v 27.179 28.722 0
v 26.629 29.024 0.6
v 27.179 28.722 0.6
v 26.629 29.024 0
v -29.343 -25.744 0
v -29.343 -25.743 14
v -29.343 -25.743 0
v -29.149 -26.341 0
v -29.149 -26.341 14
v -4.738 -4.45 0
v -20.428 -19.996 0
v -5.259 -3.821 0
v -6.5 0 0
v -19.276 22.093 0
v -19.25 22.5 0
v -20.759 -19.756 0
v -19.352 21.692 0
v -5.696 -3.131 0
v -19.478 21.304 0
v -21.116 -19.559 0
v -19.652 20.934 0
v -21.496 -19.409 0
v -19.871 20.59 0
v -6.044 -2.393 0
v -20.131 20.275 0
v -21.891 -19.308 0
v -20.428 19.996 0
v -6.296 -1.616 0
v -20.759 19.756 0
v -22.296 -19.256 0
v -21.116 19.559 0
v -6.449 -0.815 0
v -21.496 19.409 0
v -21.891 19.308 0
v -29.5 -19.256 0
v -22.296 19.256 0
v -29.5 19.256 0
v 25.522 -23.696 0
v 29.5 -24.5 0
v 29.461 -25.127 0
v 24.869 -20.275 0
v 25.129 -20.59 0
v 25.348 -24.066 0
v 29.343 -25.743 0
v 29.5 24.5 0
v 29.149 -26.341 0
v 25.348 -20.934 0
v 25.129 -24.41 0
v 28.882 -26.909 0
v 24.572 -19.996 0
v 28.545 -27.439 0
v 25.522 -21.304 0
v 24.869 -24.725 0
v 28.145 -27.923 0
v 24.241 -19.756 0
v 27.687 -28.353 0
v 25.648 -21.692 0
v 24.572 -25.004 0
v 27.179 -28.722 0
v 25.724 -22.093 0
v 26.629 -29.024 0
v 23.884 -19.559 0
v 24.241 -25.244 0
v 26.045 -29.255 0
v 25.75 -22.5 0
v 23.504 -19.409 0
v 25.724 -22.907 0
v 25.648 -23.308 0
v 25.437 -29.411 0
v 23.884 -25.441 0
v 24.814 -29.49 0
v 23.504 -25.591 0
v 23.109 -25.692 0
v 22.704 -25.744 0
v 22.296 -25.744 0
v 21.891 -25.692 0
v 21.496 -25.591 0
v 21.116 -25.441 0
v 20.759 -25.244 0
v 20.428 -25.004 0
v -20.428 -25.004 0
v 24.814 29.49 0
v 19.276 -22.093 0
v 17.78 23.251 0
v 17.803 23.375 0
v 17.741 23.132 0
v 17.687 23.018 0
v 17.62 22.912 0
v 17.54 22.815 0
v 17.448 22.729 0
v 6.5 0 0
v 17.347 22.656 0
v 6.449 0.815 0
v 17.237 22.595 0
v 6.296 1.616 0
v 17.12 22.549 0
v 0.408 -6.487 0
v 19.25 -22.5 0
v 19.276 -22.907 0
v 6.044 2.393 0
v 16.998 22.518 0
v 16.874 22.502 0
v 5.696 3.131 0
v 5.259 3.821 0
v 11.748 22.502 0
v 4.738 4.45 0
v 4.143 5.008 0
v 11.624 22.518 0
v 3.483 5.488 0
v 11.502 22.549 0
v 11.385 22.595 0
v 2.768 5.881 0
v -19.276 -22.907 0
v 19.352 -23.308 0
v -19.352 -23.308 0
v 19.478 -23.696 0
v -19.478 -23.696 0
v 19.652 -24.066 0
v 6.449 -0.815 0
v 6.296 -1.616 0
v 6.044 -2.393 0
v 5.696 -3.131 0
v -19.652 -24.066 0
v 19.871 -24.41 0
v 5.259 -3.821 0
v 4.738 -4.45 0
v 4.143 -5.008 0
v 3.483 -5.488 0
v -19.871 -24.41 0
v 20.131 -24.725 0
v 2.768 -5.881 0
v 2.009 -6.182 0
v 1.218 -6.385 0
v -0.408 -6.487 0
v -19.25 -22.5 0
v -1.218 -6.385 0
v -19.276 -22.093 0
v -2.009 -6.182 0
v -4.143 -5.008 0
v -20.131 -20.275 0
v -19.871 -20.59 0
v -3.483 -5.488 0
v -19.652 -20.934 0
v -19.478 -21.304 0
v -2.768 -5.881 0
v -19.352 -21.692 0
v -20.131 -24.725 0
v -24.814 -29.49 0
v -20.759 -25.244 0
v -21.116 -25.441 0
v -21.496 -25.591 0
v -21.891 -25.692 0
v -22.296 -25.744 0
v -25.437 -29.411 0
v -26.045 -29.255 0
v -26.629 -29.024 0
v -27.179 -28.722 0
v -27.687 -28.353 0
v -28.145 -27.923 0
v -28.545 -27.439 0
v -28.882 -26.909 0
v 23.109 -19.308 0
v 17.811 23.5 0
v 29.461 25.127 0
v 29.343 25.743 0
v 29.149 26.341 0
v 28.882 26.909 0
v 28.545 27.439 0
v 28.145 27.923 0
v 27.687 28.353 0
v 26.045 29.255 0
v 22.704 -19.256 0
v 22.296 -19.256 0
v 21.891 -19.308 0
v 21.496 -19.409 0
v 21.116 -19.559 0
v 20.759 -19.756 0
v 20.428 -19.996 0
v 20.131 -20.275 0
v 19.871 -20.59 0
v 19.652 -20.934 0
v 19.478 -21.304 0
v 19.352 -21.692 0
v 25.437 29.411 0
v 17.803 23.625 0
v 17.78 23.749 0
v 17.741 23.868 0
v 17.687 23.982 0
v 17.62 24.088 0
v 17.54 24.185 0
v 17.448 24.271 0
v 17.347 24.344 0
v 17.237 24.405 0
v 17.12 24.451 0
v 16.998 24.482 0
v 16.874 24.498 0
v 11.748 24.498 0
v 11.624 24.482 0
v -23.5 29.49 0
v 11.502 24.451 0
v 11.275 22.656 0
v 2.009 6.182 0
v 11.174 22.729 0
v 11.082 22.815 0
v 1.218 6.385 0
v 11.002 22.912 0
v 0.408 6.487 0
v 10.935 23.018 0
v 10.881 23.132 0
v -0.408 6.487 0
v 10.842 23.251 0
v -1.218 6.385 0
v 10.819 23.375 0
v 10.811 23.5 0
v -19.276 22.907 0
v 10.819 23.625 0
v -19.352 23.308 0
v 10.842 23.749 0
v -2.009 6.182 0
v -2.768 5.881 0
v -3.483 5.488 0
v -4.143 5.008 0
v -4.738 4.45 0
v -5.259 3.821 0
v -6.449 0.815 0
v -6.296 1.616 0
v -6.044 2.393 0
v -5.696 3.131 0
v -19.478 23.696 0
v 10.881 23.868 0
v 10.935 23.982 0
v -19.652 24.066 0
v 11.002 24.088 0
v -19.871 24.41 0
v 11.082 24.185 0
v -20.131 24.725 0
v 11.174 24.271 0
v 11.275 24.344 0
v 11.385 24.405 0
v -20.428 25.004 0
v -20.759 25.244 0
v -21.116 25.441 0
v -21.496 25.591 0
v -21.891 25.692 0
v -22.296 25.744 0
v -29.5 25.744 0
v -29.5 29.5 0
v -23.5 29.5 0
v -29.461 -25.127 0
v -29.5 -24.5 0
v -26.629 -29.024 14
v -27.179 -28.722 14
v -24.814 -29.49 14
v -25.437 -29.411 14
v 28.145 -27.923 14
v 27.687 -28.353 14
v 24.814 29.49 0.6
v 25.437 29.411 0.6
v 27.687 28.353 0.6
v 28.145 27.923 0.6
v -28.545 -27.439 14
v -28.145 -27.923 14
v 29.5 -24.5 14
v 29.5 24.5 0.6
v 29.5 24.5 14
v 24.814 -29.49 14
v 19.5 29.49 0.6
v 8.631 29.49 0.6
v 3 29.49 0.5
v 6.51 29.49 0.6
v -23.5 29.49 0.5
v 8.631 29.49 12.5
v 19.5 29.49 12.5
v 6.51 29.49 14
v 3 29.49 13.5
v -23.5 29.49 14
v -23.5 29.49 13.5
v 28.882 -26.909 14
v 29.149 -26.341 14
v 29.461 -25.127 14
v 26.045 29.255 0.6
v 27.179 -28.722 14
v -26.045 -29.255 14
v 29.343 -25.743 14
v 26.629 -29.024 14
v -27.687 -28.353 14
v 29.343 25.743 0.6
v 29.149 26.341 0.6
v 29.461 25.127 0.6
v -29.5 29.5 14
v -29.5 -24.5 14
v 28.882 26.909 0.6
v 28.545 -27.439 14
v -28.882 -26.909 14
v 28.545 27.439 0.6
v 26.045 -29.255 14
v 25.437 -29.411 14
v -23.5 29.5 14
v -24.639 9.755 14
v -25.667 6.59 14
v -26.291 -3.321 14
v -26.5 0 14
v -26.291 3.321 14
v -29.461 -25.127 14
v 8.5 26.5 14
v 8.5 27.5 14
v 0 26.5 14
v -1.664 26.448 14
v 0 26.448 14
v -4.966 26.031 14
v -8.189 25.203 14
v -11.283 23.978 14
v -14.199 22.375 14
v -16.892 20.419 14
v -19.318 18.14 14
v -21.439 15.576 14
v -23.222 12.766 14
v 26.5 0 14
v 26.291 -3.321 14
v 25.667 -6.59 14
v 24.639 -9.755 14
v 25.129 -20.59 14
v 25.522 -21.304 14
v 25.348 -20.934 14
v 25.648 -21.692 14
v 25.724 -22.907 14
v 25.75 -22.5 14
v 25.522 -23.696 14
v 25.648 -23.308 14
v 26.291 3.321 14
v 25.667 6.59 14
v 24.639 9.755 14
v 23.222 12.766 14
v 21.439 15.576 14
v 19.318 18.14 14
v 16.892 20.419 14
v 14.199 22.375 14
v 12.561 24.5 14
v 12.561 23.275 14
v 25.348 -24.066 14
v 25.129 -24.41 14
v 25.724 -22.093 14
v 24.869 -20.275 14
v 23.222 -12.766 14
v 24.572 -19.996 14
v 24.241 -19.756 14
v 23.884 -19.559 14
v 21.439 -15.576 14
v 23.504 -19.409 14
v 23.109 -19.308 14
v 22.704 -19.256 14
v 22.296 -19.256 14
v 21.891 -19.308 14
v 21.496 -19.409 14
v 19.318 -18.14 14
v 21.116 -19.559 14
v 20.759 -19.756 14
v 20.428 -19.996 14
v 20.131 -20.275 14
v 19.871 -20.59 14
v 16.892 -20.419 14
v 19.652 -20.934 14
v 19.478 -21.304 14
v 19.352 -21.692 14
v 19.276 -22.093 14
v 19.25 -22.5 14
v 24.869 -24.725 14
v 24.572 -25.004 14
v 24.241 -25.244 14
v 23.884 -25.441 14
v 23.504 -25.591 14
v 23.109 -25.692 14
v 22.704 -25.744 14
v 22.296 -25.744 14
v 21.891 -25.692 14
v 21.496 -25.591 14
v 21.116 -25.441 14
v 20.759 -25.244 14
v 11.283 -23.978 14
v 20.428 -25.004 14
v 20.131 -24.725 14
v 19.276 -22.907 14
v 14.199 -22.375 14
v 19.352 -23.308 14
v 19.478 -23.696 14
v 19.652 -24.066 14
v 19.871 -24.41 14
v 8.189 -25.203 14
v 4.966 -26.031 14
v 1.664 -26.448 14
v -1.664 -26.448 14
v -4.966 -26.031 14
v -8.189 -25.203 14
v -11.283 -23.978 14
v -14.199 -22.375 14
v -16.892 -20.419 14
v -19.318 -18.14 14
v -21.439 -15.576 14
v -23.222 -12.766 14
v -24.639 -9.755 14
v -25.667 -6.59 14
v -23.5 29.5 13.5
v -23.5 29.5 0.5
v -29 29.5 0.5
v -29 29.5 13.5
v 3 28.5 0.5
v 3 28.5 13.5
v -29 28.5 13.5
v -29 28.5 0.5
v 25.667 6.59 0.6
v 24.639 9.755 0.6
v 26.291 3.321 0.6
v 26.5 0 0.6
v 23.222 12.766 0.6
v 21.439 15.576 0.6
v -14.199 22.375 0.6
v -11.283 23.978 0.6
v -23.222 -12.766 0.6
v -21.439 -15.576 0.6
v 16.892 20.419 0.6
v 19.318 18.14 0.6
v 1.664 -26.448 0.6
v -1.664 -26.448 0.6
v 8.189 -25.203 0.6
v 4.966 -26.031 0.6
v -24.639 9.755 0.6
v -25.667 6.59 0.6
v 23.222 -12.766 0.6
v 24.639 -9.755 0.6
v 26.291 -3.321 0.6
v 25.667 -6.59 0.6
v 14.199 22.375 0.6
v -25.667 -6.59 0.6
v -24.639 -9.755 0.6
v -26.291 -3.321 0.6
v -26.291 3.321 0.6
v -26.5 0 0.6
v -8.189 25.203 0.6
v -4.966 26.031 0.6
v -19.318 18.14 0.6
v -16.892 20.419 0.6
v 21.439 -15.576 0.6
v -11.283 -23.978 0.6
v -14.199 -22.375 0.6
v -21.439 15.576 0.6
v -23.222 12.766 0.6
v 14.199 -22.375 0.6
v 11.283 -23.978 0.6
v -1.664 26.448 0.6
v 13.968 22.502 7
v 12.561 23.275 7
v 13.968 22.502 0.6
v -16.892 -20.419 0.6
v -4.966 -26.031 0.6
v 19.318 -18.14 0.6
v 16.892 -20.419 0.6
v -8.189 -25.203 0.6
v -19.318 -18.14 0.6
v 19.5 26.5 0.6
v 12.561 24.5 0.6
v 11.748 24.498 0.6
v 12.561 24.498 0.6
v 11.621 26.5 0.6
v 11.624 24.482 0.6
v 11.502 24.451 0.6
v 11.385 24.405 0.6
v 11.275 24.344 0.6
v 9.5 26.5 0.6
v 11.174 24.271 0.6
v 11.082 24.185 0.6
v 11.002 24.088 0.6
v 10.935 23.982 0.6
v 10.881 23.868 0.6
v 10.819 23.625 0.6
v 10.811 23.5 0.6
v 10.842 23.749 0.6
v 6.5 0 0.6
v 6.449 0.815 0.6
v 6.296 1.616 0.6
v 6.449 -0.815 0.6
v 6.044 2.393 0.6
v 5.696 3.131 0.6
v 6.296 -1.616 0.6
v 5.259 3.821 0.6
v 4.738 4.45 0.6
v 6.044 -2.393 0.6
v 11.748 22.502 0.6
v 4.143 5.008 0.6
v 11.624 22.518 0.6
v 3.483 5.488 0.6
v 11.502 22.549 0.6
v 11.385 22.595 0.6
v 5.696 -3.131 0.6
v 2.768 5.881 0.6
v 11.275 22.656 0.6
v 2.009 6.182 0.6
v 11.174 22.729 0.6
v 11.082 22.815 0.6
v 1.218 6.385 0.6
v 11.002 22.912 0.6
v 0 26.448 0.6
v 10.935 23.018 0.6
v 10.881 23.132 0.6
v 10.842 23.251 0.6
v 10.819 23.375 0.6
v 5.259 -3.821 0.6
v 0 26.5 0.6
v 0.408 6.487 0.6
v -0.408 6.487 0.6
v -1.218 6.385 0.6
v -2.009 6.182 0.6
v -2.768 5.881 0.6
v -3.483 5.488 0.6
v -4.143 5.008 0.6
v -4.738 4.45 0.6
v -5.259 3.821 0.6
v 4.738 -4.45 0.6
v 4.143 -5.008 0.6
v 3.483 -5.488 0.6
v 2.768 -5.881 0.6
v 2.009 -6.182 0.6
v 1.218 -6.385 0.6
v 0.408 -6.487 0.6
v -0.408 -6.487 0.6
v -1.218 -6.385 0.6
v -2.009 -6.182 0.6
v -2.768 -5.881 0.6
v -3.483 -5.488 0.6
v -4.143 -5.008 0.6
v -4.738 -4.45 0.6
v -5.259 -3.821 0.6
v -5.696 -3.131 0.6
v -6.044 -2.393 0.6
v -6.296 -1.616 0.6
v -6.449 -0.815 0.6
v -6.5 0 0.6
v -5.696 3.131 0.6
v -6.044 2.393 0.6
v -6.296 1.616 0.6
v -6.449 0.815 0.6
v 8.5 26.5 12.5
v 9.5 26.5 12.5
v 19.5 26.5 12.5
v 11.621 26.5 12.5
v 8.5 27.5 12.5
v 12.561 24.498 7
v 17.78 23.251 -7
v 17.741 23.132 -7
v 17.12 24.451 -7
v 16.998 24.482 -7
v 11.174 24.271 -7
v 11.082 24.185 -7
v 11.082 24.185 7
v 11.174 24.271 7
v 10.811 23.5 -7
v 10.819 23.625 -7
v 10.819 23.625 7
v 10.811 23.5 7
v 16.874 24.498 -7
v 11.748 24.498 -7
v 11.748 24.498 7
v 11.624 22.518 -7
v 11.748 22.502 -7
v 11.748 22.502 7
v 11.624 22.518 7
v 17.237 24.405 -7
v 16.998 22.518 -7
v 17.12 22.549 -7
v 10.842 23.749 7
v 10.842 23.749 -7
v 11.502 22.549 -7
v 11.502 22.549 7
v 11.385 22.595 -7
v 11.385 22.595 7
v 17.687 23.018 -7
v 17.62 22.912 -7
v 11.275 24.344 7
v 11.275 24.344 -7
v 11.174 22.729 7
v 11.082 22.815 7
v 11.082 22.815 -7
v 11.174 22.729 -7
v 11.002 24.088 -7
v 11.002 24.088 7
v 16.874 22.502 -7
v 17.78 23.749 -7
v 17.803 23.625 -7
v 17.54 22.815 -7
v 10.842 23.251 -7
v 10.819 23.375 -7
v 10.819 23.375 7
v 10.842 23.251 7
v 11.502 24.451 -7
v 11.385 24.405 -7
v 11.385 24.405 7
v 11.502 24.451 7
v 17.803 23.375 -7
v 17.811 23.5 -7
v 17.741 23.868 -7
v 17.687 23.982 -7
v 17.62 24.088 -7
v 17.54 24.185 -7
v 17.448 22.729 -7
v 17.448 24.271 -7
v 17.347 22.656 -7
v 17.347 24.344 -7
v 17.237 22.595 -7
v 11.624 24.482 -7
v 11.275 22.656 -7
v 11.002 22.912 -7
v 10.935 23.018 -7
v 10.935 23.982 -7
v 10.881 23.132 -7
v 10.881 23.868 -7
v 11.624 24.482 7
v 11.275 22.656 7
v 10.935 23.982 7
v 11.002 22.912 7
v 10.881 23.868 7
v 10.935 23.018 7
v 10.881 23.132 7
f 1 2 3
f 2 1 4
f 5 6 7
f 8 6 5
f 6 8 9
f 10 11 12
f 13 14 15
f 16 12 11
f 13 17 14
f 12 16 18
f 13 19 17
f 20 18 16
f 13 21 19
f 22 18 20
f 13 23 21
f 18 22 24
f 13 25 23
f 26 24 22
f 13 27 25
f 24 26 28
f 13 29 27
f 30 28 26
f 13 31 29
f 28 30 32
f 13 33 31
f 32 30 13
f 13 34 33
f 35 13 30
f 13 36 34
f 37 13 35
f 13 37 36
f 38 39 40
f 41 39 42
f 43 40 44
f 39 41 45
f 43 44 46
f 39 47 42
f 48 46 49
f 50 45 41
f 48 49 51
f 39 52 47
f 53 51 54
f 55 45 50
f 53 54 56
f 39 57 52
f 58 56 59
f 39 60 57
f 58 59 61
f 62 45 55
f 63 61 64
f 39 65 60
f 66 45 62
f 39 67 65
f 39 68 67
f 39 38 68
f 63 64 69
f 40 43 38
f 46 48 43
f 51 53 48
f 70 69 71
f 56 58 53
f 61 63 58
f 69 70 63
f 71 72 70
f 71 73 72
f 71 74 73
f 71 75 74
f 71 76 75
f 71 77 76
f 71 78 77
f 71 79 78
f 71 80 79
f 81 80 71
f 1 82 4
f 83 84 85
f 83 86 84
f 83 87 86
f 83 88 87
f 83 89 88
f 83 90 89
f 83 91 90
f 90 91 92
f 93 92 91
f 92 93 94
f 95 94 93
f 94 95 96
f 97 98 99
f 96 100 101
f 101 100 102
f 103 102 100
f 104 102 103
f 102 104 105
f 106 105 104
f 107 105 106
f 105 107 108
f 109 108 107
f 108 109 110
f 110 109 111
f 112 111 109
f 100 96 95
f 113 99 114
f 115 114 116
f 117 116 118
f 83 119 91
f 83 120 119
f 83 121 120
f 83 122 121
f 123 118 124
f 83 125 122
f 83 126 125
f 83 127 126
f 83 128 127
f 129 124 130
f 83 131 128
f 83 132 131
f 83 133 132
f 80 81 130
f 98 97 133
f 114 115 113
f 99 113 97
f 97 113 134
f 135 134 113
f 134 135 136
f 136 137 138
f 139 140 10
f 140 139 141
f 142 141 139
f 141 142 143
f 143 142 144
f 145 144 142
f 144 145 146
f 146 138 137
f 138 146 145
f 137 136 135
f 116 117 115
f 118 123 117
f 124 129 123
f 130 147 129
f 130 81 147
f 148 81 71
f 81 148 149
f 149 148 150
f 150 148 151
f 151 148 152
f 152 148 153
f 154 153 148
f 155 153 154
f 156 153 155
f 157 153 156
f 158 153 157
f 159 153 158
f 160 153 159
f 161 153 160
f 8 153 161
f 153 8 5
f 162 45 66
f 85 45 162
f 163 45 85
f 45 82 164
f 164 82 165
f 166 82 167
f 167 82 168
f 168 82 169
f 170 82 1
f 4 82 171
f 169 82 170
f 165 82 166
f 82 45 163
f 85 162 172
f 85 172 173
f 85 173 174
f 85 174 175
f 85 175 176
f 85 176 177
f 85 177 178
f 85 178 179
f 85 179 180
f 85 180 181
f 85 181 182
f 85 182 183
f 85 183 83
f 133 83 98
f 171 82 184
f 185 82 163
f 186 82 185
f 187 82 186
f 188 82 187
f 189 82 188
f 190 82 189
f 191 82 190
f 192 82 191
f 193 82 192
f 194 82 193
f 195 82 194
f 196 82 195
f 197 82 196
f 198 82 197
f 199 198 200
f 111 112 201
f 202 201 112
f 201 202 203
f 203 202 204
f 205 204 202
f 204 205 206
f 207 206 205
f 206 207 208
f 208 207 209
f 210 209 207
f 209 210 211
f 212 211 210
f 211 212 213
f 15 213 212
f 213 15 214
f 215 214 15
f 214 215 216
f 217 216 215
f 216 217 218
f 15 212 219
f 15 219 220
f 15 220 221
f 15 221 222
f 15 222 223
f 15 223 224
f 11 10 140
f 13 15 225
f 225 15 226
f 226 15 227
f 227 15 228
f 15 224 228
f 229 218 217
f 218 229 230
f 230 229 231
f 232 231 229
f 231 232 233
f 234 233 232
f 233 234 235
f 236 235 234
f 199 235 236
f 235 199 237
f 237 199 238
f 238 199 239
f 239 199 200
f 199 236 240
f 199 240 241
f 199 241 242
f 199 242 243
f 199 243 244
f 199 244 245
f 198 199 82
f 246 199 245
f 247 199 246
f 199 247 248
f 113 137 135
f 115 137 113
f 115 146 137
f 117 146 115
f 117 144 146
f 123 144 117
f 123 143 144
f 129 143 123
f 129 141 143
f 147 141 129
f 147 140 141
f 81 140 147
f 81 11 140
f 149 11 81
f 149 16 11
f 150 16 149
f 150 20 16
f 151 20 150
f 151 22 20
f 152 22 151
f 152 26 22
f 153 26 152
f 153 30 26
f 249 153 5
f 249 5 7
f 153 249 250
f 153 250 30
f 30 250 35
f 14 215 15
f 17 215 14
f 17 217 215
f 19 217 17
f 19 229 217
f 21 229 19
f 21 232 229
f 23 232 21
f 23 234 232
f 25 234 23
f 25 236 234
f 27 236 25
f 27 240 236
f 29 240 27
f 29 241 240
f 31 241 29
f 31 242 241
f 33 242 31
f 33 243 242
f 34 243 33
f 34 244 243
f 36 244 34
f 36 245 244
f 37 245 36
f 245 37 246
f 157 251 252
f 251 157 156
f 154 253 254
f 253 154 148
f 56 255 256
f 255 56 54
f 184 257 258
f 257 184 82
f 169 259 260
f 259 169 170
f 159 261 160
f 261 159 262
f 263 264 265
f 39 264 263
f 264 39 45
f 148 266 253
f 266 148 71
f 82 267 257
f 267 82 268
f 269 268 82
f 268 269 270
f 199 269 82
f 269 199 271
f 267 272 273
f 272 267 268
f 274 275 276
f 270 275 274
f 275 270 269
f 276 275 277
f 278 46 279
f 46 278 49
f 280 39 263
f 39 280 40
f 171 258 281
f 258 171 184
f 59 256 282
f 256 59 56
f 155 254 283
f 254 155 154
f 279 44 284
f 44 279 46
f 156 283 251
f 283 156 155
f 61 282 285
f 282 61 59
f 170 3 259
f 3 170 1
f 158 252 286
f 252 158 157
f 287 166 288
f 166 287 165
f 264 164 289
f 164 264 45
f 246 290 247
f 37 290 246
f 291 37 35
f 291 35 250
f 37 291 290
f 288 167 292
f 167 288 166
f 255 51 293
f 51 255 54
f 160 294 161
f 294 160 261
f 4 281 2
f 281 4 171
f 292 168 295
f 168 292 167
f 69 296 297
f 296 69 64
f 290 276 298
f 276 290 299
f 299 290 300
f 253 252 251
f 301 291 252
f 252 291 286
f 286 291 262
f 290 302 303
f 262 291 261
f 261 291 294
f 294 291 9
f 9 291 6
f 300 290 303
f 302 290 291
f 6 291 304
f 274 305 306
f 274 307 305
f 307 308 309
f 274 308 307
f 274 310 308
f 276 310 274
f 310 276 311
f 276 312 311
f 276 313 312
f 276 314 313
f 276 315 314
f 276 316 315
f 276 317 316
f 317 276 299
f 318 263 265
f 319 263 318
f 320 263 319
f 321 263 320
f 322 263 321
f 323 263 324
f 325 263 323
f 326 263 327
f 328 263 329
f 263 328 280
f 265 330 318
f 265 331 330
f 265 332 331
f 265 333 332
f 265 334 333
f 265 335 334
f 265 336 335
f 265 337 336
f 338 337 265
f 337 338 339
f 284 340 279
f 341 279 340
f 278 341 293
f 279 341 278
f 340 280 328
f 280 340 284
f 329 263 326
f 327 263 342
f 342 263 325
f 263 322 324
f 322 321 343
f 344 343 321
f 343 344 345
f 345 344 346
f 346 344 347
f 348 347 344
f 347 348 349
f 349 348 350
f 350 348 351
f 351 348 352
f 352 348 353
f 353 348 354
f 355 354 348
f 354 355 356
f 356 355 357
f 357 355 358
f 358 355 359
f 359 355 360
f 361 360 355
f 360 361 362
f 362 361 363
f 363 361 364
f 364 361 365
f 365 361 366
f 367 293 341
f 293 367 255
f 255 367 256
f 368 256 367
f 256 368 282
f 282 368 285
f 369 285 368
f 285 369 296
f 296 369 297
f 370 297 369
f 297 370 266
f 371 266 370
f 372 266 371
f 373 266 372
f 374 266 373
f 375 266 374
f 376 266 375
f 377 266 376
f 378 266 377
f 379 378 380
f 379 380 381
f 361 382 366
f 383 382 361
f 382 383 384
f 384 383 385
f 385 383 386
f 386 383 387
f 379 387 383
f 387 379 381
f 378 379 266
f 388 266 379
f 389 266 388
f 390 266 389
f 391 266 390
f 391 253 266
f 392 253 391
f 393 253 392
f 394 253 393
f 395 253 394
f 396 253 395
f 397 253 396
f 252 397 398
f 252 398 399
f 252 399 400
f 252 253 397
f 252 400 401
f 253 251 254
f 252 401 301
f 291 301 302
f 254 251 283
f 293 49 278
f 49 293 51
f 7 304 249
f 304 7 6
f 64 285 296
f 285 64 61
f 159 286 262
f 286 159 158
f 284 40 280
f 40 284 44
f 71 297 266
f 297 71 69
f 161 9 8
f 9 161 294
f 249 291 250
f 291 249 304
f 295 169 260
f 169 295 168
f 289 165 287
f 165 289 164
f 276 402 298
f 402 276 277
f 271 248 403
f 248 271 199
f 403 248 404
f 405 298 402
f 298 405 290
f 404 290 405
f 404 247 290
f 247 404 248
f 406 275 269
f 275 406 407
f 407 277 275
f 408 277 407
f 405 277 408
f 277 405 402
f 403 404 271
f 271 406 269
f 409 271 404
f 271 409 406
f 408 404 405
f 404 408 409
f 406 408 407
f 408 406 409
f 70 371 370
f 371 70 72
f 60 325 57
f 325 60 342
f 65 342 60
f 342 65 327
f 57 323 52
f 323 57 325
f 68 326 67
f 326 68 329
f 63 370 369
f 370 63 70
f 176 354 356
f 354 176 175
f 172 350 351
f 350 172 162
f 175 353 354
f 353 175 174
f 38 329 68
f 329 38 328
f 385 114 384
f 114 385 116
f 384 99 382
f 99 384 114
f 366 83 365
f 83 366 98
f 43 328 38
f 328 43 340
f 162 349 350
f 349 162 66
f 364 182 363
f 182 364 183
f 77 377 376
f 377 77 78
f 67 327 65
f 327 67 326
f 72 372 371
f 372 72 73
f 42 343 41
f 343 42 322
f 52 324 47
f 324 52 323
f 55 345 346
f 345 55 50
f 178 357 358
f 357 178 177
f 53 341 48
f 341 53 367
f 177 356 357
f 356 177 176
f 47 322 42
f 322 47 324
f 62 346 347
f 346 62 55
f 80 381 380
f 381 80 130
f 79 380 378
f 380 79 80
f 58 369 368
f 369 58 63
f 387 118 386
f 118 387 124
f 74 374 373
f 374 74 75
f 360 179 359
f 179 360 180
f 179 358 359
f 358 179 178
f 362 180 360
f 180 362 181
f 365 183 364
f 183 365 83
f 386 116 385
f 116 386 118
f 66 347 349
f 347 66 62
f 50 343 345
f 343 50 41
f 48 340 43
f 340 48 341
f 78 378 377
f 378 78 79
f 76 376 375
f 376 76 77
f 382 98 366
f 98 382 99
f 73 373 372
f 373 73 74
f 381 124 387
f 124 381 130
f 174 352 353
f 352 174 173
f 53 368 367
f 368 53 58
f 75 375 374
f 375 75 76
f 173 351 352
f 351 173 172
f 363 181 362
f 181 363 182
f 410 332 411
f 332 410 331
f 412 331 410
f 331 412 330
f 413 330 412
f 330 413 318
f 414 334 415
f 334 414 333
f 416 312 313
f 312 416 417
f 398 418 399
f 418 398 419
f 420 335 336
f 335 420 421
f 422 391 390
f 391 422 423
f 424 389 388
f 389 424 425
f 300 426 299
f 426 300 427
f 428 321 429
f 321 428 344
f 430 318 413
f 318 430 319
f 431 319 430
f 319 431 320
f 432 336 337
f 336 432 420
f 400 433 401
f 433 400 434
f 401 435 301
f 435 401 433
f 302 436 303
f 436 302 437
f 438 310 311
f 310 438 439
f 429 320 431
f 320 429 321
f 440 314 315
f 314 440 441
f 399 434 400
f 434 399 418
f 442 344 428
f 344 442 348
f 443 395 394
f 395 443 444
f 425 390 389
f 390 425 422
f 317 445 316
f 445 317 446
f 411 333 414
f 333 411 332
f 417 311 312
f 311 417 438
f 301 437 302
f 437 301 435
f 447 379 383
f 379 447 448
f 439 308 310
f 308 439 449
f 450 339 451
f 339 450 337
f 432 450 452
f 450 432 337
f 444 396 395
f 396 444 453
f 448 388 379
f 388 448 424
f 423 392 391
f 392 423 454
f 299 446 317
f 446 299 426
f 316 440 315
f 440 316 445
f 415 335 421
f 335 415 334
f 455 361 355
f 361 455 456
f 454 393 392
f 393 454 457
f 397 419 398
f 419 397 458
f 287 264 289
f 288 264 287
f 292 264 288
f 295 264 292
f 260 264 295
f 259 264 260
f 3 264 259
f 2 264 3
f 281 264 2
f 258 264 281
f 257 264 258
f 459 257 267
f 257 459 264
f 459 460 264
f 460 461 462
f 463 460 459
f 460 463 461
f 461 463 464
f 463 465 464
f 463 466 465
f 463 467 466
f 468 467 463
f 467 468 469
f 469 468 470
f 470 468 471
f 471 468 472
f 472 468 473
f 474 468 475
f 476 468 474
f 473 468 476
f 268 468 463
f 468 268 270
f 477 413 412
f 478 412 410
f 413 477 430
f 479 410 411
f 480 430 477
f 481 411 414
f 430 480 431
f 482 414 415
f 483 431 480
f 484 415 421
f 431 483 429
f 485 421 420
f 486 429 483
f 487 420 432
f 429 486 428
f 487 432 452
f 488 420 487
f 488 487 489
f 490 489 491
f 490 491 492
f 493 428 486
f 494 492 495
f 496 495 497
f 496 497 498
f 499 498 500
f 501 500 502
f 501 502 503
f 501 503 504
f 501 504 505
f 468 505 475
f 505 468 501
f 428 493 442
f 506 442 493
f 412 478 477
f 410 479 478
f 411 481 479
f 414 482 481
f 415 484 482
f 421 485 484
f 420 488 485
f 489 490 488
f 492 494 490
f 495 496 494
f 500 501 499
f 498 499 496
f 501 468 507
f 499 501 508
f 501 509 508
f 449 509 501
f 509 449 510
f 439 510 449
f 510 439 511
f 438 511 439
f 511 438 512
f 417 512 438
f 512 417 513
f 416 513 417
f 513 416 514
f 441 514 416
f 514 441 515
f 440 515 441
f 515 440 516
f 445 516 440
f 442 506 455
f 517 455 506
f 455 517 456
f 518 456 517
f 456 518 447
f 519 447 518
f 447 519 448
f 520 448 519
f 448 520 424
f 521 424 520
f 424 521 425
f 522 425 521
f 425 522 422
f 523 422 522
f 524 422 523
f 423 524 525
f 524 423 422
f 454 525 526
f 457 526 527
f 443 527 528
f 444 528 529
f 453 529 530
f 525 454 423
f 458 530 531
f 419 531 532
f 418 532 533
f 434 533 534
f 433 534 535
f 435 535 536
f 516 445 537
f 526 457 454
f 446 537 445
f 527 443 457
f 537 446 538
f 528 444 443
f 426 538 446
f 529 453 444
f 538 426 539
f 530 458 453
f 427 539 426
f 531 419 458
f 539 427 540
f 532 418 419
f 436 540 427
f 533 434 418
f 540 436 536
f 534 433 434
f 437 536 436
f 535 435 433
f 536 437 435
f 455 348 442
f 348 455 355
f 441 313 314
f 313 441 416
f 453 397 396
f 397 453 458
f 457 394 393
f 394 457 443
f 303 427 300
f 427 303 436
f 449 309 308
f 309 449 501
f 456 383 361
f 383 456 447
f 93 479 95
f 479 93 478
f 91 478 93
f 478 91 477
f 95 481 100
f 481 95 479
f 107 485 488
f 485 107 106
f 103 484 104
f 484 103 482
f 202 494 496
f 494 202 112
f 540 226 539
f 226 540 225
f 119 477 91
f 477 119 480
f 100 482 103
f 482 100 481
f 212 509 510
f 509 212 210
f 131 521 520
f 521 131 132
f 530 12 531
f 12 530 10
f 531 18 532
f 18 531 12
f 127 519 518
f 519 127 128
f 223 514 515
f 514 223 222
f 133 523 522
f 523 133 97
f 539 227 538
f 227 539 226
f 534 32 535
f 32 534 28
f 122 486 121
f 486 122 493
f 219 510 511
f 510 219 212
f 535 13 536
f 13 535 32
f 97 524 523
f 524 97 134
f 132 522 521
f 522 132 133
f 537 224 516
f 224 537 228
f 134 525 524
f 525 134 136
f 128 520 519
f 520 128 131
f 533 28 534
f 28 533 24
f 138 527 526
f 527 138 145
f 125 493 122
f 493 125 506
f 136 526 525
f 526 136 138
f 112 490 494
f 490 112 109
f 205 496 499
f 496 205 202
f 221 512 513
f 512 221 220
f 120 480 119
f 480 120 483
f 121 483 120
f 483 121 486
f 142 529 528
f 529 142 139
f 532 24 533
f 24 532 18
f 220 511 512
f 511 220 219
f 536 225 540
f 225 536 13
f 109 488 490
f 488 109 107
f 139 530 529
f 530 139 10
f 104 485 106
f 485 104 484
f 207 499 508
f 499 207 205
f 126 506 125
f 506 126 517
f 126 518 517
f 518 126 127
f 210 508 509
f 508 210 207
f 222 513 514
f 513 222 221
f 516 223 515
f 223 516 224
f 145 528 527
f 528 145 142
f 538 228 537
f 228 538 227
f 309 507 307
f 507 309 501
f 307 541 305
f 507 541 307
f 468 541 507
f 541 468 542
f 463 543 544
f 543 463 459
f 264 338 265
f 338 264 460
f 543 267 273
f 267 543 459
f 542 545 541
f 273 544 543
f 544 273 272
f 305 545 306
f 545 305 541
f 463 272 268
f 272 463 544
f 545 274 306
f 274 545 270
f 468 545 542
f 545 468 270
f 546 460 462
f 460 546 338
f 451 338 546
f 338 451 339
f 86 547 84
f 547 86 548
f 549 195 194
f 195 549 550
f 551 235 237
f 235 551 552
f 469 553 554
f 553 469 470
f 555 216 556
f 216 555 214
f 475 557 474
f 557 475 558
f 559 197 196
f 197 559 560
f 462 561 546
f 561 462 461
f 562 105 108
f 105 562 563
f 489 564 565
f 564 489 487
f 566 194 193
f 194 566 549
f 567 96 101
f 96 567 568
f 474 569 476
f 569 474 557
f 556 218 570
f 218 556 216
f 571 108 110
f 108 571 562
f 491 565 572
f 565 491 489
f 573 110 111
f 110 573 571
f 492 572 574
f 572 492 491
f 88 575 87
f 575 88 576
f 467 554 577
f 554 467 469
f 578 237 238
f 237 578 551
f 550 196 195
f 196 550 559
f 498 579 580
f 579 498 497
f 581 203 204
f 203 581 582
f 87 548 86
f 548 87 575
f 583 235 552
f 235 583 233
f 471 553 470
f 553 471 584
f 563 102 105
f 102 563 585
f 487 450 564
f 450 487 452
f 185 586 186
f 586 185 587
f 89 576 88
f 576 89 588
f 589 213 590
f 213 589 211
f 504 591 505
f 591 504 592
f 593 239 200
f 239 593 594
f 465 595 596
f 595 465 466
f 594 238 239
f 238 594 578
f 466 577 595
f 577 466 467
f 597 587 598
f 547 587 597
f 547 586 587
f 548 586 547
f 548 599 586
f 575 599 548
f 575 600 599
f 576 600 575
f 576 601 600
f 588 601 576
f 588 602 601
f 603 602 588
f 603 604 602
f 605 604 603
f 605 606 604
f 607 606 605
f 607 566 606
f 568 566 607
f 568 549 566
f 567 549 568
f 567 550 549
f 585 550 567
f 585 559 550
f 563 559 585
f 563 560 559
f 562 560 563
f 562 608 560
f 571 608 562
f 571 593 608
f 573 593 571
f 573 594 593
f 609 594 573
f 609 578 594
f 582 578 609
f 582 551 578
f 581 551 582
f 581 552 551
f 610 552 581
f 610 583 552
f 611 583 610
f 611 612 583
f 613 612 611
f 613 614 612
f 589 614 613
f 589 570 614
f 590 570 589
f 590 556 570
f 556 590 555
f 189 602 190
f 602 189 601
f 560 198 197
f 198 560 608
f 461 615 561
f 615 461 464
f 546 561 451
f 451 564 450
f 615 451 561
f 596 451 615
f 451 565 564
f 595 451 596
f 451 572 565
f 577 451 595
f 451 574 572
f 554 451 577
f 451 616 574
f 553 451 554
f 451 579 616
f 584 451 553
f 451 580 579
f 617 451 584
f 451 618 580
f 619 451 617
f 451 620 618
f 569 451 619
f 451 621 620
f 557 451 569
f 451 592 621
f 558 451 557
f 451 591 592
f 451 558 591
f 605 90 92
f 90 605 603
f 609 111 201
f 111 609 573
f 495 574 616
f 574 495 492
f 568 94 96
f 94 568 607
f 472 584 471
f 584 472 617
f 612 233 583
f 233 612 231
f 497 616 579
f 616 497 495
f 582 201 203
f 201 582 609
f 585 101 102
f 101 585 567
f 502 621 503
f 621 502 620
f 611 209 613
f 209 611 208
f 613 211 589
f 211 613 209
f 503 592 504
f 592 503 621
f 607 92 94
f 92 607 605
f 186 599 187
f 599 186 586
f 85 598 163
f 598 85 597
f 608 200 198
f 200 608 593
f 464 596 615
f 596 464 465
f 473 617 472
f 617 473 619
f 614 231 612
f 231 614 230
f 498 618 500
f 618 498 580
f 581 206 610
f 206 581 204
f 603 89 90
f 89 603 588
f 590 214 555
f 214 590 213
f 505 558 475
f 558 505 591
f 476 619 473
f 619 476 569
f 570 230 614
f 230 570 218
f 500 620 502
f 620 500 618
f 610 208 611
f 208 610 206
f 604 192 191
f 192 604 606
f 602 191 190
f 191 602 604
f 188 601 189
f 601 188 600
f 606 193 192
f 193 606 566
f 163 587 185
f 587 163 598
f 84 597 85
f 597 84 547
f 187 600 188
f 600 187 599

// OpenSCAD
$fn = 50;


union() {
	difference() {
		union() {
			hull() {
				translate(v = [-24.5000000000, 24.5000000000, 0]) {
					cylinder(h = 14, r = 5);
				}
				translate(v = [24.5000000000, 24.5000000000, 0]) {
					cylinder(h = 14, r = 5);
				}
				translate(v = [-24.5000000000, -24.5000000000, 0]) {
					cylinder(h = 14, r = 5);
				}
				translate(v = [24.5000000000, -24.5000000000, 0]) {
					cylinder(h = 14, r = 5);
				}
			}
			translate(v = [-29.5000000000, 23.5000000000, 0]) {
				cube(size = [6, 6, 14]);
			}
		}
		union() {
			translate(v = [-30.0000000000, -22.5000000000, -250.0000000000]) {
				rotate(a = [0, 0, 0]) {
					difference() {
						union() {
							hull() {
								translate(v = [7.5000000000, 0, 0]) {
									cylinder(h = 250, r = 3.2500000000, r1 = 3.2500000000, r2 = 3.2500000000);
								}
								translate(v = [-7.5000000000, 0, 0]) {
									cylinder(h = 250, r = 3.2500000000, r1 = 3.2500000000, r2 = 3.2500000000);
								}
							}
						}
						union();
					}
				}
			}
			translate(v = [-30.0000000000, 22.5000000000, -250.0000000000]) {
				rotate(a = [0, 0, 0]) {
					difference() {
						union() {
							hull() {
								translate(v = [7.5000000000, 0, 0]) {
									cylinder(h = 250, r = 3.2500000000, r1 = 3.2500000000, r2 = 3.2500000000);
								}
								translate(v = [-7.5000000000, 0, 0]) {
									cylinder(h = 250, r = 3.2500000000, r1 = 3.2500000000, r2 = 3.2500000000);
								}
							}
						}
						union();
					}
				}
			}
			translate(v = [-29.0000000000, 28.5000000000, 0.5000000000]) {
				cube(size = [32, 1, 13.0000000000]);
			}
			translate(v = [22.5000000000, -22.5000000000, 0]) {
				cylinder(h = 100, r = 3.2500000000);
			}
			translate(v = [0, 0, 0.6000000000]) {
				cylinder(h = 16.4000000000, r = 26.5000000000);
			}
			translate(v = [0, 0, -7.0000000000]) {
				cylinder(h = 14, r = 6.5000000000);
			}
			translate(v = [0.0000000000, 24.5000000000, 0.6000000000]) {
				cube(size = [29.5000000000, 2, 16.4000000000]);
			}
			translate(v = [19.5000000000, 24.5000000000, 0.6000000000]) {
				cube(size = [10, 5, 16.4000000000]);
			}
			translate(v = [8.5000000000, 24.5000000000, 12.5000000000]) {
				cube(size = [21, 5, 1.5000000000]);
			}
			translate(v = [5.7500000000, 30.2500000000, 0.6000000000]) {
				rotate(a = [0, 0, -45]) {
					cube(size = [7.5000000000, 1.5000000000, 16.4000000000]);
				}
			}
			translate(v = [5.0610000000, 22.5000000000, 0.6000000000]) {
				cube(size = [7.5000000000, 2, 13.4000000000]);
			}
		}
	}
	union() {
		translate(v = [14.3110000000, 23.5000000000, -7.0000000000]) {
			rotate(a = [0, 0, 0]) {
				difference() {
					union() {
						#hull() {
							#translate(v = [2.5000000000, 0, 0]) {
								cylinder(h = 14, r = 1.0000000000, r1 = 1.0000000000, r2 = 1.0000000000);
							}
							#translate(v = [-2.5000000000, 0, 0]) {
								cylinder(h = 14, r = 1.0000000000, r1 = 1.0000000000, r2 = 1.0000000000);
							}
						}
					}
					union();
				}
			}
		}
	}
}
